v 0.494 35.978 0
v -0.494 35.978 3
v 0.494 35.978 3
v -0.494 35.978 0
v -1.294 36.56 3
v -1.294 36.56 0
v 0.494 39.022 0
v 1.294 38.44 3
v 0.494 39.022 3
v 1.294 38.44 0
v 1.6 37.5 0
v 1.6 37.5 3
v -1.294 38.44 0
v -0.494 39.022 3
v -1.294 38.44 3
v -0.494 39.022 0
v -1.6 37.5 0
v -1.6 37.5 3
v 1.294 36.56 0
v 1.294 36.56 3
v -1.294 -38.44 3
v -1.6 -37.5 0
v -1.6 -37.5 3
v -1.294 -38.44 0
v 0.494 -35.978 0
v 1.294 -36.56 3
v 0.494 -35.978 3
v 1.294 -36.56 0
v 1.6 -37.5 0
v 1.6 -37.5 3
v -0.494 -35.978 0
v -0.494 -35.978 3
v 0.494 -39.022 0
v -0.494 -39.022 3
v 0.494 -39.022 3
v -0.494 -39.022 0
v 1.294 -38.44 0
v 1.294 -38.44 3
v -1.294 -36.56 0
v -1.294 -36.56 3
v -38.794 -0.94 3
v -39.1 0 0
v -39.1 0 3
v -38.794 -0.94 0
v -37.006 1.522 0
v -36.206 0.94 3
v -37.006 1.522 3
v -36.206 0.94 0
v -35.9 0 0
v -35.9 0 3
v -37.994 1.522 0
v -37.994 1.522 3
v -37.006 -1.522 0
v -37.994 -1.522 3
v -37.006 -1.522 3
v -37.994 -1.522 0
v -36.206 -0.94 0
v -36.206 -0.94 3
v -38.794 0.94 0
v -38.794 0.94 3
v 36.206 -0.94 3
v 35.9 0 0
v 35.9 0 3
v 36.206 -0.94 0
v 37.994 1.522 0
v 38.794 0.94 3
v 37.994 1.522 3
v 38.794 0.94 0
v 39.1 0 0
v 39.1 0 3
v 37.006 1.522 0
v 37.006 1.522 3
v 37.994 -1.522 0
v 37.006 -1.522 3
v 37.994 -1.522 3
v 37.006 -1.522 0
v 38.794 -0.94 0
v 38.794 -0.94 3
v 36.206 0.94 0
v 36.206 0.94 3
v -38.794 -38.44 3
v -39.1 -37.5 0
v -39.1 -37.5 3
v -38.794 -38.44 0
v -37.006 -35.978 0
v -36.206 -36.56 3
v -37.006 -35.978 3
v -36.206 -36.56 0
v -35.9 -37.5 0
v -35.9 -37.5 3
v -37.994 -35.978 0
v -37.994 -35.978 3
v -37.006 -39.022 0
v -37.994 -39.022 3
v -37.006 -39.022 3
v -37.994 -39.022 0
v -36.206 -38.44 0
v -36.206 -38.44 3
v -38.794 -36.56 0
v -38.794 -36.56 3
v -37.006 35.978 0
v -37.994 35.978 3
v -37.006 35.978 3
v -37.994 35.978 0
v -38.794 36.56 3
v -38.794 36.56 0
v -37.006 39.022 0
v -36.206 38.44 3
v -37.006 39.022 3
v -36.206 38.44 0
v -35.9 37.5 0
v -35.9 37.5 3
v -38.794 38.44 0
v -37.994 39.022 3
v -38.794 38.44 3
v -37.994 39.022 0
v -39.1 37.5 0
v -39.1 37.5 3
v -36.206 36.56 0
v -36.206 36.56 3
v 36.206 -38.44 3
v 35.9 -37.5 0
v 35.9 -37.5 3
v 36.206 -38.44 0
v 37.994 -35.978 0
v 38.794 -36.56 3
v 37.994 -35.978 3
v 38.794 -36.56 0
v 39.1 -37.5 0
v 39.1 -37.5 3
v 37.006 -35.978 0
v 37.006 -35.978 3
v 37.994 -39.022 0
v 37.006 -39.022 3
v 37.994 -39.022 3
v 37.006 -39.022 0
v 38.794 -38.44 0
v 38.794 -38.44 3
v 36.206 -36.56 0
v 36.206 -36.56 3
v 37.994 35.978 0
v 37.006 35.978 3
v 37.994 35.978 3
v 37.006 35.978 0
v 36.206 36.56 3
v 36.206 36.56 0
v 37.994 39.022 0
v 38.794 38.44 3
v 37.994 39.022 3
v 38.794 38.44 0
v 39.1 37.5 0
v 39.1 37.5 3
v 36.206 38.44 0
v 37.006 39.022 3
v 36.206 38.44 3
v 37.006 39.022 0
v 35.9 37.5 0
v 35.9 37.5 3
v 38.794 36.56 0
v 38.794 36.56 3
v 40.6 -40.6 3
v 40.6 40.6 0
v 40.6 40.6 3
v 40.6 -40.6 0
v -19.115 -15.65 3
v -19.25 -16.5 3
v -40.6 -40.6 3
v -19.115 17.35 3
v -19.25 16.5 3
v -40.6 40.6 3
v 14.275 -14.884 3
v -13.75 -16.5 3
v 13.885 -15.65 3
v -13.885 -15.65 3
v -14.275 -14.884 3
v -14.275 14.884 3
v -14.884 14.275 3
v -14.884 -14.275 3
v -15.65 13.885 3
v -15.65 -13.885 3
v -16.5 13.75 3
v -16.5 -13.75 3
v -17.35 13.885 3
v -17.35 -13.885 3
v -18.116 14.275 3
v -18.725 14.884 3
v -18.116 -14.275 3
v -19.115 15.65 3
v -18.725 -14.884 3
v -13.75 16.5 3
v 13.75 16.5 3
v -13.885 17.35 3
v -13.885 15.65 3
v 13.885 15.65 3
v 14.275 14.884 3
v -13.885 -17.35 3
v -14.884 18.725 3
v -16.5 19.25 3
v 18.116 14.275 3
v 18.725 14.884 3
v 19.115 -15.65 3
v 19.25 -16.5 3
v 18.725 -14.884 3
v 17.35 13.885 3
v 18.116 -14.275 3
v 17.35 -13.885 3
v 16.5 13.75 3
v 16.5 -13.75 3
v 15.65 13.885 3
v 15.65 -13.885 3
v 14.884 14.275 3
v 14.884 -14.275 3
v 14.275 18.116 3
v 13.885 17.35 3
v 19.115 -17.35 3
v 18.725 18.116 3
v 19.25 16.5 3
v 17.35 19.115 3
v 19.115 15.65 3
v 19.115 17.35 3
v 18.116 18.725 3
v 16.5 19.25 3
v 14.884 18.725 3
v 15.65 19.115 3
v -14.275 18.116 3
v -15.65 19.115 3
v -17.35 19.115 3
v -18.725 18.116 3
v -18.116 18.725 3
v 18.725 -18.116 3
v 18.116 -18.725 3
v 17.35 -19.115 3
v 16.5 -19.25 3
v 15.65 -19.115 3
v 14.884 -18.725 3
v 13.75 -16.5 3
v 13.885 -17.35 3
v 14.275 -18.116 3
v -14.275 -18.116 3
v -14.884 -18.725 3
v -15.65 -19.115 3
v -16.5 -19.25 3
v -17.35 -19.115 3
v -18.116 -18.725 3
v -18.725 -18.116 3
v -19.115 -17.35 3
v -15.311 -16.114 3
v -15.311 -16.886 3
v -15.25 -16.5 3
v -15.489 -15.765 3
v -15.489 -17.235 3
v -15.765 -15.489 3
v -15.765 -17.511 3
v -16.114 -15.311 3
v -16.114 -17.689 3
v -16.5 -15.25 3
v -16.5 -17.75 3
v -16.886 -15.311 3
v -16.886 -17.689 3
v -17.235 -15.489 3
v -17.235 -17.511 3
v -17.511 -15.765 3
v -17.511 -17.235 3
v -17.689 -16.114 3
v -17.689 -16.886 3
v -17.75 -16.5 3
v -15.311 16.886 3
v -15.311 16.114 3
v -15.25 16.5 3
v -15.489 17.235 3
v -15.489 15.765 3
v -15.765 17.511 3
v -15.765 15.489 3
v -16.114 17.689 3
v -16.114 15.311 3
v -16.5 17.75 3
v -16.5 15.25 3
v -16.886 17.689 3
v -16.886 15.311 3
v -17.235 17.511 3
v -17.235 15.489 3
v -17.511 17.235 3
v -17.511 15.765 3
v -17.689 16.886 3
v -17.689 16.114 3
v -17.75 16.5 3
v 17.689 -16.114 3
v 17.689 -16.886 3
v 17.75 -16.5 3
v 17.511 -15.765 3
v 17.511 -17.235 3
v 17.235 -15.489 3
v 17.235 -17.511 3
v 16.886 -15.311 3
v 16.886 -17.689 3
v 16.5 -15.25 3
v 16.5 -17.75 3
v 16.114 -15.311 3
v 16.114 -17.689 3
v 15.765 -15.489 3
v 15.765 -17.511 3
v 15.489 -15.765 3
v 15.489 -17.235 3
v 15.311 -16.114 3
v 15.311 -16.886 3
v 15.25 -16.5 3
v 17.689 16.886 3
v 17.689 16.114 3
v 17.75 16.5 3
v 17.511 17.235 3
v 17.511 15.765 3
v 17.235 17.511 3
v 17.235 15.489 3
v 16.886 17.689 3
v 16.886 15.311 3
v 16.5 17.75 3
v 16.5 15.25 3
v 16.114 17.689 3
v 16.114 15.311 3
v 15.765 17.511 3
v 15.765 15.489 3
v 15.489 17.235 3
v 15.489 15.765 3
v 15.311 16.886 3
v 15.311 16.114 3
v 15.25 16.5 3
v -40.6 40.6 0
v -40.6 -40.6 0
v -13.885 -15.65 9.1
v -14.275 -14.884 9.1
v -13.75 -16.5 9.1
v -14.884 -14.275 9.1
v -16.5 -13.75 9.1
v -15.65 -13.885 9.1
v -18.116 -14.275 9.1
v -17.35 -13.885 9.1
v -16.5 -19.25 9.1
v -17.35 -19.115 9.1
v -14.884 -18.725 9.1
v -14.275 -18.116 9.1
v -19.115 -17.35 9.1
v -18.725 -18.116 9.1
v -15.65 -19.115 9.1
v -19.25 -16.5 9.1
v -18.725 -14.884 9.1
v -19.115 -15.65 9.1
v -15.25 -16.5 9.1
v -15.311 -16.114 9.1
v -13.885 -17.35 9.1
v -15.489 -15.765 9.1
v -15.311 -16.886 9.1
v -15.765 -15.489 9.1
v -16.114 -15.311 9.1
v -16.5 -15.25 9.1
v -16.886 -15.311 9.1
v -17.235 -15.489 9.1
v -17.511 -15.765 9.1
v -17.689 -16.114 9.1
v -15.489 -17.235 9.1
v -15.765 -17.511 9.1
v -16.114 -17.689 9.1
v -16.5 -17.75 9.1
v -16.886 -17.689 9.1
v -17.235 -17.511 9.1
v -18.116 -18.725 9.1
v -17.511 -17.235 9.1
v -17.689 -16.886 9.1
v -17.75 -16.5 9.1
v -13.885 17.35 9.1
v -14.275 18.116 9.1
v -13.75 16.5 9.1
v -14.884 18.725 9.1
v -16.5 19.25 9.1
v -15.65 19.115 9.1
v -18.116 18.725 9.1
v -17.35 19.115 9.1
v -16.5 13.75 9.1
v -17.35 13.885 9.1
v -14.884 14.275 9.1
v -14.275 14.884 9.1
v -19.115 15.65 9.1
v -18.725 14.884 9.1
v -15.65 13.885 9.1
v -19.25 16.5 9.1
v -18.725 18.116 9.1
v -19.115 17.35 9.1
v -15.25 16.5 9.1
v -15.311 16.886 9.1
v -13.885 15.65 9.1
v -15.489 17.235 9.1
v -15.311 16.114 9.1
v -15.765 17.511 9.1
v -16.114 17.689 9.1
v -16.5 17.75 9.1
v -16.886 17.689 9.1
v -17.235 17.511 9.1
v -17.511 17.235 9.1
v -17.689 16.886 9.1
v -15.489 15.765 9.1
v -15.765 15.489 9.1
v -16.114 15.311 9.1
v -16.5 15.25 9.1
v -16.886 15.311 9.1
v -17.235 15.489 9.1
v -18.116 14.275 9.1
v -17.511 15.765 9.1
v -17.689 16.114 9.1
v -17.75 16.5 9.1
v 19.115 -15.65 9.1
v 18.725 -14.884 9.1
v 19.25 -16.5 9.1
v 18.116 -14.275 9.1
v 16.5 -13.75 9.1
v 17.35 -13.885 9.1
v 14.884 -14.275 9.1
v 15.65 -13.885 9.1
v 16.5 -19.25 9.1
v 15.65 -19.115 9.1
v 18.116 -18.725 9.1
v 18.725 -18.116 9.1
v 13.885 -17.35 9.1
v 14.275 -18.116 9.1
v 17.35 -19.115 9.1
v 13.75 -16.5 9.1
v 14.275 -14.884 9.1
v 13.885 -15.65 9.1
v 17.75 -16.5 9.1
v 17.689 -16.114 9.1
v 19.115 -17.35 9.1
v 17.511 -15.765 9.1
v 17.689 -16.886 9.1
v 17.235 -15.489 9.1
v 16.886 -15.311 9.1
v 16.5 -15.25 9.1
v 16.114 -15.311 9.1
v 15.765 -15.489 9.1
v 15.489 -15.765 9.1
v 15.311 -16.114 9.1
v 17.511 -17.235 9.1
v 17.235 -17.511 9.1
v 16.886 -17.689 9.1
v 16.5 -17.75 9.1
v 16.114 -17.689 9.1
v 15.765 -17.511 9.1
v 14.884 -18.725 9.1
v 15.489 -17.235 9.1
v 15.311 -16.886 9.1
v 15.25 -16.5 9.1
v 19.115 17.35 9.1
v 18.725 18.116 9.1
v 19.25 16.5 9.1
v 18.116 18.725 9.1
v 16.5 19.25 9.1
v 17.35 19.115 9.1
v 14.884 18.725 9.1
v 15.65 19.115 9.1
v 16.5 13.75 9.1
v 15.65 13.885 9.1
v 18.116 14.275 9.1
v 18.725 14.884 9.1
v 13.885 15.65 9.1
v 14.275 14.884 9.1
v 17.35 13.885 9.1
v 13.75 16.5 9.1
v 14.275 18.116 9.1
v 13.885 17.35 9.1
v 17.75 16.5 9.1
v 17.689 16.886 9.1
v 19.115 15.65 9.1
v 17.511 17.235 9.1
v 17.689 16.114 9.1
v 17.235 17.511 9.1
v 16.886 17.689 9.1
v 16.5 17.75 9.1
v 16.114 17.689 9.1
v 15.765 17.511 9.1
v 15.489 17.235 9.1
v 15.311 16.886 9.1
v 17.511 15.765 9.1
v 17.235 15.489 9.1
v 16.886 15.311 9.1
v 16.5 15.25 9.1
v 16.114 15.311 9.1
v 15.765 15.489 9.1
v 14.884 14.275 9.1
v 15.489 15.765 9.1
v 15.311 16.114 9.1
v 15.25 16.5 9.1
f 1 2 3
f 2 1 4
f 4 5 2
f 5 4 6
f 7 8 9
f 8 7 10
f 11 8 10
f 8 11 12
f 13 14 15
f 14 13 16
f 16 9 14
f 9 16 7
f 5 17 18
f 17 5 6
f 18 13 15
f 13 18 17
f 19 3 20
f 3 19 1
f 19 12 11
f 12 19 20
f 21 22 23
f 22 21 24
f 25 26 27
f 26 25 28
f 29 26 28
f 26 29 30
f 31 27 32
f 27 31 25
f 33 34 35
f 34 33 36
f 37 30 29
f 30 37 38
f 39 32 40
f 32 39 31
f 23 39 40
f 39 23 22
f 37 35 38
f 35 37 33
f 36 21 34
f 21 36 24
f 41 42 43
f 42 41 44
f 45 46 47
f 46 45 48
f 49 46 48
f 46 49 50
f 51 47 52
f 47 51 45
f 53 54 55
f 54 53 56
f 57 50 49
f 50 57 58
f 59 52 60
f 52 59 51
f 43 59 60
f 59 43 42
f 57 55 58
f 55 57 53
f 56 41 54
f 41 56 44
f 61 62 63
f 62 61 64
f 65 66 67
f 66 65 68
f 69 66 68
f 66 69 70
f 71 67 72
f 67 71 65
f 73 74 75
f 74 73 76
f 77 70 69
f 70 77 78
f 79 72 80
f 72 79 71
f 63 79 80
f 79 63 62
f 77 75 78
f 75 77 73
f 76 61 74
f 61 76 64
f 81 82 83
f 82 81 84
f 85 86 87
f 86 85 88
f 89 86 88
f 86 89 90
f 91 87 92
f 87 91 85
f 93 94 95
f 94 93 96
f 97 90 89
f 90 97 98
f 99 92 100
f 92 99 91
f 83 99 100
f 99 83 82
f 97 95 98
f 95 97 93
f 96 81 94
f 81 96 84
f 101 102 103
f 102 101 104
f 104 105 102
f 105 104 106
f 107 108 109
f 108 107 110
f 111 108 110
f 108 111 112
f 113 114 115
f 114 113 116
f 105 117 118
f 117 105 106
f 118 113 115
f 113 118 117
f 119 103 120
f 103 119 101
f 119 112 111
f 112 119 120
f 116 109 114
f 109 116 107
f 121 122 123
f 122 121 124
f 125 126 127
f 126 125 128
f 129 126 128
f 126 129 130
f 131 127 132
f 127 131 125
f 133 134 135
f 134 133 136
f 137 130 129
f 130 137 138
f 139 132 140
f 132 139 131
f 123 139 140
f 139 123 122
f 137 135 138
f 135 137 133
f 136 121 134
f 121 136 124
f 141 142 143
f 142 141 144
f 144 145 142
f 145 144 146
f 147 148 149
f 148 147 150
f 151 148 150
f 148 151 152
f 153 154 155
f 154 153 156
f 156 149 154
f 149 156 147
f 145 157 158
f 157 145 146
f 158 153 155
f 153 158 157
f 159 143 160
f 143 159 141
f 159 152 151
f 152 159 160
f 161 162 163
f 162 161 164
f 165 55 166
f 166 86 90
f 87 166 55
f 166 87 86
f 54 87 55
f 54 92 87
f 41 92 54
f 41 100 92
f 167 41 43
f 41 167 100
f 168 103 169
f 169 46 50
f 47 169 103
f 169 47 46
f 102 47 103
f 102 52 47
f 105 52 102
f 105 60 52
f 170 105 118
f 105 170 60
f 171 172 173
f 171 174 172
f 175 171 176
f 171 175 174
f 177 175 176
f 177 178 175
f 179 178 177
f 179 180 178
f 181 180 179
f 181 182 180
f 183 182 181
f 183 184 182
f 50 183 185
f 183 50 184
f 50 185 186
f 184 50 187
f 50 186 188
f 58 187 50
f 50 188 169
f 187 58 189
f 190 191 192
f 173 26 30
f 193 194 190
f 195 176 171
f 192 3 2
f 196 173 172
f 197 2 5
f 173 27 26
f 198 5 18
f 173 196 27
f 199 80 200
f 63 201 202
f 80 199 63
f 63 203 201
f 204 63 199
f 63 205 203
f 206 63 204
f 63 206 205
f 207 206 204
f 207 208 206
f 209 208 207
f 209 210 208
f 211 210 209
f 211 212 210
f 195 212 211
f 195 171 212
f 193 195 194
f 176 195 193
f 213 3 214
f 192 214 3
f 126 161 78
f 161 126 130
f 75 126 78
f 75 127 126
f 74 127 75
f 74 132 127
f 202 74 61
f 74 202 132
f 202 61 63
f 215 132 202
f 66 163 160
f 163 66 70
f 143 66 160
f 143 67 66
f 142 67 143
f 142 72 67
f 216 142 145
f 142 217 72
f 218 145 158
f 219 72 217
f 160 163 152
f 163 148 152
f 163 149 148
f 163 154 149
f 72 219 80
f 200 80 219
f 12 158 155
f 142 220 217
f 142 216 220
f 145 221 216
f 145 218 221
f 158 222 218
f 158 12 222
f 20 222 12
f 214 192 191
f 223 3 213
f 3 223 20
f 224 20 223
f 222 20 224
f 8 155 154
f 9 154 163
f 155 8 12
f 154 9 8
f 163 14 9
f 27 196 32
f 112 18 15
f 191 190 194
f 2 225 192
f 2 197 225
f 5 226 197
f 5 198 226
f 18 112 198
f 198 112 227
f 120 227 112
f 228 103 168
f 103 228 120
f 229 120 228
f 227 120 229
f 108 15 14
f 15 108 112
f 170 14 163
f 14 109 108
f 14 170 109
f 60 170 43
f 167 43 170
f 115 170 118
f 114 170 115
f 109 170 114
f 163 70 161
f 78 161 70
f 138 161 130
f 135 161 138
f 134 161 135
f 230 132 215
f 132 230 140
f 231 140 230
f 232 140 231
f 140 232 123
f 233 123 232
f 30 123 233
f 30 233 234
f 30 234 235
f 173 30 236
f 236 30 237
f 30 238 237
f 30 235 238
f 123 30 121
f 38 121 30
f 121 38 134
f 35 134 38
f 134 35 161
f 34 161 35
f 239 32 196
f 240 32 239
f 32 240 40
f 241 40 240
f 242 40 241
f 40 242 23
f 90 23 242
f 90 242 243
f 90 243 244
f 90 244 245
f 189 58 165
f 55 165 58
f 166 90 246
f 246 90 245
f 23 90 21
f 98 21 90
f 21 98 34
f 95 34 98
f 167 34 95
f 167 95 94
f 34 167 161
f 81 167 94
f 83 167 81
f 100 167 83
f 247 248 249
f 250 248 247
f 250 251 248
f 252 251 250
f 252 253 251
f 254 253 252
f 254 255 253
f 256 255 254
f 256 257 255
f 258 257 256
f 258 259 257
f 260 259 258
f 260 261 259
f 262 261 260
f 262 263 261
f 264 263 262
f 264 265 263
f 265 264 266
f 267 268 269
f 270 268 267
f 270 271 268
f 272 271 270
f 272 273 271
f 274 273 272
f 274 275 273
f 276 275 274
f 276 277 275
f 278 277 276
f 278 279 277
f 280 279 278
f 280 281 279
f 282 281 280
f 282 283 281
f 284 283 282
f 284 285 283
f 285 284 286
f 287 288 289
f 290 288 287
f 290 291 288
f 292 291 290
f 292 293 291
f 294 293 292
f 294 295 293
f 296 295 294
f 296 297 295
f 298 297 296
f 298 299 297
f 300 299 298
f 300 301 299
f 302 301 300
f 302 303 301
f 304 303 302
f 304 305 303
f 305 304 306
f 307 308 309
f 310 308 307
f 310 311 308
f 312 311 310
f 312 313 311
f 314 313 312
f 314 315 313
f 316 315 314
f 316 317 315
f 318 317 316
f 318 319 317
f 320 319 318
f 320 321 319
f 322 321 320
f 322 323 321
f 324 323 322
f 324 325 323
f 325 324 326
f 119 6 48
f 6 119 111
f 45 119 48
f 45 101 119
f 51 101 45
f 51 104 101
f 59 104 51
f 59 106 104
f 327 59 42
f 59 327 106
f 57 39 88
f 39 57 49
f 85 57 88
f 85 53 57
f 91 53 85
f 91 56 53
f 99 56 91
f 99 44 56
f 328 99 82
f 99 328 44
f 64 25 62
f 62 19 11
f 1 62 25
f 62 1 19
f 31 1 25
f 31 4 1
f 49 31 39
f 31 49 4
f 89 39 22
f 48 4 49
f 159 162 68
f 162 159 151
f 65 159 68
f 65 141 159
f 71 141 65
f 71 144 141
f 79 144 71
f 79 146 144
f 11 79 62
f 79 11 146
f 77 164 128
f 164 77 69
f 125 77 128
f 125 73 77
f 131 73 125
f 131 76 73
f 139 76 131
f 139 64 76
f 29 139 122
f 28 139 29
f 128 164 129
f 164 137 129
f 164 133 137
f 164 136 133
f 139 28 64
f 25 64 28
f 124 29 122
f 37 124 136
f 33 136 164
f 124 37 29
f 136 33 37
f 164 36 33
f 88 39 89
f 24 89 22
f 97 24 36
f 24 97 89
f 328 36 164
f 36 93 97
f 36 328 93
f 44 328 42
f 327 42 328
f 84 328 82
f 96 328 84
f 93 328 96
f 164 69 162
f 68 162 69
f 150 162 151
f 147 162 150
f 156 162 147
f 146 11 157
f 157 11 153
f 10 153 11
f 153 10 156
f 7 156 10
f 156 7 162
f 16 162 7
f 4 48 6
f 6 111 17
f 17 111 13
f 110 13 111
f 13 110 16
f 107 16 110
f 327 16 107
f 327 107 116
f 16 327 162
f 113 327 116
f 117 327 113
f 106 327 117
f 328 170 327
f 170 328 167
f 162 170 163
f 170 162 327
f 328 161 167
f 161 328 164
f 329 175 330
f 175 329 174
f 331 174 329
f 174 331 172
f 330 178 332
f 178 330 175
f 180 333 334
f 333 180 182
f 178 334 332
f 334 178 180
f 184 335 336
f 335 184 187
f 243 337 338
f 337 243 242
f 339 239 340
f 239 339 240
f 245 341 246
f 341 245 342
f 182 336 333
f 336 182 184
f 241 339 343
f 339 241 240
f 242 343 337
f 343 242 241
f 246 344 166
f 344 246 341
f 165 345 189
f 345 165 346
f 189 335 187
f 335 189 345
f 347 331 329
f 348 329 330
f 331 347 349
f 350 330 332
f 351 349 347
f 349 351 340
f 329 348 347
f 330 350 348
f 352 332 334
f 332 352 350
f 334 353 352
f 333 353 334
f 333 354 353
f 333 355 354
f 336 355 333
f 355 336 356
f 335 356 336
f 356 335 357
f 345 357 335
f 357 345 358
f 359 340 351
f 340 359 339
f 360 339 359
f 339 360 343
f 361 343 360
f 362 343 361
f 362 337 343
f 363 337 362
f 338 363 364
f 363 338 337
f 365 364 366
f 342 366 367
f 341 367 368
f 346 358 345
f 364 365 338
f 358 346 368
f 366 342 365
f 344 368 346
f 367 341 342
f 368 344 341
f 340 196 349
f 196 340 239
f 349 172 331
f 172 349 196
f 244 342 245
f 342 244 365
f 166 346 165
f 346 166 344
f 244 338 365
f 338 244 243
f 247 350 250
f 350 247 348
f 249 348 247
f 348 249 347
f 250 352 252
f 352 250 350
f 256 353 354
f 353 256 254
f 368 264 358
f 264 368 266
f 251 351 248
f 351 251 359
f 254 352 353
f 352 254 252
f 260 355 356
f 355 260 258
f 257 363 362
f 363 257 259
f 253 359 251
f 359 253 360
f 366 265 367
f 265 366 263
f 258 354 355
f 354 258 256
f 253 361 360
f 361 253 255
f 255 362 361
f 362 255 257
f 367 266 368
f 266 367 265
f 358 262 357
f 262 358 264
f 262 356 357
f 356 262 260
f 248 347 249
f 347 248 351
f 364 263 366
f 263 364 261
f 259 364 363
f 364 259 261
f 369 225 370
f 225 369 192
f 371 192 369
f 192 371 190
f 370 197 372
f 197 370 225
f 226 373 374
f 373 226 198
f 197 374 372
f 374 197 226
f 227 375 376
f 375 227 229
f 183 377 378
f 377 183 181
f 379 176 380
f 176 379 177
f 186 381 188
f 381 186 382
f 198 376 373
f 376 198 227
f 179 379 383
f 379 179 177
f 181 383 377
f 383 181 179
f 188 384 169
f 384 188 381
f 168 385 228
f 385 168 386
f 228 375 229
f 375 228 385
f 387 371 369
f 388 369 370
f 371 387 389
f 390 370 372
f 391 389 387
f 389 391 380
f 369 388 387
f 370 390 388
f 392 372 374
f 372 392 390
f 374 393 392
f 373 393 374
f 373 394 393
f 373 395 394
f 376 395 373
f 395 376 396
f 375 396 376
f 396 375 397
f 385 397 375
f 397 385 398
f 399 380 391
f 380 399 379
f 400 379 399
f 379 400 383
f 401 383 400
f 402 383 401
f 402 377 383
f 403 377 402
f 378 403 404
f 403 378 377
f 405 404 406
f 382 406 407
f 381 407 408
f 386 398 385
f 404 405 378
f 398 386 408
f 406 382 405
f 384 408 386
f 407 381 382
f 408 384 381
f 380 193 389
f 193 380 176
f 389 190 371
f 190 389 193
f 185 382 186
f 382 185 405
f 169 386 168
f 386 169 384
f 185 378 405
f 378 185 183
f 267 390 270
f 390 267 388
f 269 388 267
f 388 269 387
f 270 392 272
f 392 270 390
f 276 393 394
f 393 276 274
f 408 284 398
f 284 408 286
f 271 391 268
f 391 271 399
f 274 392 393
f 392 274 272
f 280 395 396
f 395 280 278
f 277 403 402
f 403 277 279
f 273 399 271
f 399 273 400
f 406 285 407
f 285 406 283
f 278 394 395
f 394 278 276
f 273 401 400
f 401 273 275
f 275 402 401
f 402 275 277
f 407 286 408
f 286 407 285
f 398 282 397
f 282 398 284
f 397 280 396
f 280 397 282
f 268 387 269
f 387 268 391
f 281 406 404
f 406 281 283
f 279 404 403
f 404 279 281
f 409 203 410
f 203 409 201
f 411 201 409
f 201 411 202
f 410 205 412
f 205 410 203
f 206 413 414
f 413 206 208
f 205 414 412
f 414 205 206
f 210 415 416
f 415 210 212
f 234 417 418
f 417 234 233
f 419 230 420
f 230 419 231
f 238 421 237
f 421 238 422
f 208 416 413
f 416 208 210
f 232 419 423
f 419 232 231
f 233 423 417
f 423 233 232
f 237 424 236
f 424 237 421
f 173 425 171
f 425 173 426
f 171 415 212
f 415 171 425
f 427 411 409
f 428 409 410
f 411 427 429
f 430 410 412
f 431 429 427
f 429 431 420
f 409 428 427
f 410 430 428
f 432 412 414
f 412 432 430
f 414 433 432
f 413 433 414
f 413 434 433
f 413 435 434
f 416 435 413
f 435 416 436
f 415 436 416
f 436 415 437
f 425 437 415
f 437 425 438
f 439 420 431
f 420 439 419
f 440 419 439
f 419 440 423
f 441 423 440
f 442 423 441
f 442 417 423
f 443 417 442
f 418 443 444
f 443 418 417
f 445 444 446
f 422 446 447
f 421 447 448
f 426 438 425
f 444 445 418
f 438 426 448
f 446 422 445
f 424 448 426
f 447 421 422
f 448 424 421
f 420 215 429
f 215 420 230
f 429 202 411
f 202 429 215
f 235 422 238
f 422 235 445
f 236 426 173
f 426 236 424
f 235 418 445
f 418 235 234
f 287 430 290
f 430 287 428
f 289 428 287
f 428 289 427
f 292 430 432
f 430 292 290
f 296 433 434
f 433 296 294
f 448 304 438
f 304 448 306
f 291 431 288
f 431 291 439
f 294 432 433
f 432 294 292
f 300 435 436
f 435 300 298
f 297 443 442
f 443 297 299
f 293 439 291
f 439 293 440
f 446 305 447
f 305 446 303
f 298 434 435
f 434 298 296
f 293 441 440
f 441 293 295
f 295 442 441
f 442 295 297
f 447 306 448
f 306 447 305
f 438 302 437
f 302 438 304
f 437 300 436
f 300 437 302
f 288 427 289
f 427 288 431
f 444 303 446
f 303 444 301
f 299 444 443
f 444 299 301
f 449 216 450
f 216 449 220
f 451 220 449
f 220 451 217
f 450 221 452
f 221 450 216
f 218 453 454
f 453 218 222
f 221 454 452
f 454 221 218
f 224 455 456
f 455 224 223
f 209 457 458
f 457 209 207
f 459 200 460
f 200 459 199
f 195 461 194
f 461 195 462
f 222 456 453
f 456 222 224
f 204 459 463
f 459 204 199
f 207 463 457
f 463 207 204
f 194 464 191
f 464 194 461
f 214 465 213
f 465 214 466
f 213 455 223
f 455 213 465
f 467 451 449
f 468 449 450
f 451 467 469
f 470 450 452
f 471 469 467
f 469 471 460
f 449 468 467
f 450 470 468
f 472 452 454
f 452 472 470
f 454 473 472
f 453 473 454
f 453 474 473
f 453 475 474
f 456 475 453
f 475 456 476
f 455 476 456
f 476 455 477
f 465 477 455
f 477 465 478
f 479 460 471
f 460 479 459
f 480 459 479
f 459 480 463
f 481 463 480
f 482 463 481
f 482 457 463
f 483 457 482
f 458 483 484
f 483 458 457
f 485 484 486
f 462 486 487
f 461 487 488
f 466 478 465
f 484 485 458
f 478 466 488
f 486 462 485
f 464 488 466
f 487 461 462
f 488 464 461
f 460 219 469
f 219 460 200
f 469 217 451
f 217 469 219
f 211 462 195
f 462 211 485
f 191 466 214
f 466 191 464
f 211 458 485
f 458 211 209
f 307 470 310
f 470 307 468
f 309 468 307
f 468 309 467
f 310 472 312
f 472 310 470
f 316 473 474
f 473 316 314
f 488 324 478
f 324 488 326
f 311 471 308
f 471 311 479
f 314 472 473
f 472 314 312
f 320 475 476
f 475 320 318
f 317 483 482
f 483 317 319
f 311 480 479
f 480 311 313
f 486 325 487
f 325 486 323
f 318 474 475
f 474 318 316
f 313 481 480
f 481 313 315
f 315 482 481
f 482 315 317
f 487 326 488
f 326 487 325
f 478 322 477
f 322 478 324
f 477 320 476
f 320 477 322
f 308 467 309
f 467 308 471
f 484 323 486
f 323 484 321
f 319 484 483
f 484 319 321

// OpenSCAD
//Multirotor plate customizer V0.1.3 by eriqjo
//
//v0.2.1 6/4/2014	Major bug fix for standoffs and holes not rendering correctly
//v0.2.0 5/26/2014	Added more clearance between slots and mounting holes
//					Added KK2 Mounting feature
//					Shortened radio supports to minimize plug interference
//					Added custom plate features
//v0.1.2 5/25/2014	Improved resolution for holes
//					Added option for control board mount
//v0.1.1 5/24/2014	Initial release of project
//

//CUSTOMIZER VARIABLES

/* [Plate Dimensions] */

//Choose predefined platform, or custom
Multirotor_Platform = 3; // [1:Arducopter, 3:Custom]

//Choose type of plate to create
Plate_Type = 2; // [1:Radio,2:Control Board,3:Slotted,4:Custom Plate]

//Choose how thick to make the plate, mm
Plate_Thickness = 3; // [1:6]

Mounting_Bolt_Size = 3.2; // [2.2:M2,3.2:M3,4.2:M4,5.2:M5,6.2:M6]

//Center-to-center distance of adjacent mounting holes (custom only), mm
X_and_Y_Distance = 75; //

//Add a hole in the middle?
Additional_Hole = "Yes"; // [Yes,No] 

/* [Radio Plate] */

//How wide (y) is your radio RX, mm?
Radio_Width = 34.5;

//How long (x) is your radio RX, mm?
Radio_Length = 52;

//How many cable-ties to hold the radio down?
Cable_Tie_Ct = 2; // [0:3]

//How wide are your cable-ties, mm?
Cable_Tie_Width = 4;

//How tall do you want the supports, mm?
Support_Height = 5;

/* [Control plate] */

Control_Board = 2; // [1:KK2,2:Custom]

//Center-to-center distance in X-direction (custom only), mm
Control_Board_X = 33;

//Center-to-center distance in Y-direction (custom only), mm
Control_Board_Y = 33;

//How tall to make standoffs
Standoff_Height = 6;

//What size bolt to attach board (custom only)
Control_Board_Bolt = 2.5; // [1.6:M2,2.05:M2.5,2.5:M3,3.5:M4,4.5:M5]

/* [Slotted Plate] */

//How wide do you want the slots, mm?
Slot_Width = 3; // [1:5]

//Note: Too many wide slots will intersect.
Number_of_Slots = 11;

Profile = 1; // [1:Rounded,2:Square]

/* [Custom Plate] */

//Size of holes, mm 
Hole_Diameter = 3;

//Matrix of hole coordinates, ex: [[1,2], [2,3]]
Hole_Matrix = [[-22, -22], [-22, 22], [22, -22], [22, 22]];

//Hole diameter inside standoffs, mm
Standoff_Hole_D = 2.5;

//How tall to make the standoffs, mm
Custom_Standoff_Height = 6;

//Matrix of standoff coordinates, ex: [[1,2], [2,3]]
Standoff_Matrix = [[-15, -15], [-15, 15], [15, -15], [15, 15]];

//CUSTOMIZER VARIABLES END

/* [Hidden] */

Support_Width = 4; // How wide the radio structure will be

Support_Length = 4; // How long the corners are

Radio_Dim_Margin = 0.3; // Makes the holder a little bit bigger than measured so there is no interference

AntiCoPlanar = 0.2; // Make things bigger by this much so there are not ambiguous faces

Safety_Perimeter = 3; // Distance between the bolt hole and the edge of the plate

//***************************************************

module makeBase(){

	q = X_and_Y_Distance;

	if (Multirotor_Platform == 1){
		difference(){
			baseExtrude(68.25);
			baseHoles(68.25);
		}
	}

	if (Multirotor_Platform == 2){
		difference(){
			baseExtrude(q);
			baseHoles(q);
		}
	}

	if (Multirotor_Platform == 3){
		difference(){
			baseExtrude(q);
			baseHoles(q);
		}
	}

}

//***************************************************

module makeCustomPlate(){

	difference(){
		union(){
			addStandOffs(Standoff_Matrix, Standoff_Hole_D, Custom_Standoff_Height);
			makeBase();
		}	
		addHoles(Hole_Matrix, Hole_Diameter);
	}
}

//***************************************************

module makeSlots(dist){

	availableXY = dist - 2*Safety_Perimeter - Mounting_Bolt_Size;
	supportX = (availableXY - (Number_of_Slots * Slot_Width))/(Number_of_Slots - 1);
	echo(supportX);
	offset = supportX + Slot_Width;

	translate([-availableXY/2 + Slot_Width/2, 0, 0])
	for (i = [0:Number_of_Slots-1]){
		if (Profile == 1){
			translate([i * offset, 0, 0]){
				union(){
					cube([Slot_Width, availableXY - Slot_Width, 2*Plate_Thickness], center = true);
					translate([0, (availableXY - Slot_Width)/2, 0])	{
						cylinder(h = 2*Plate_Thickness, r = Slot_Width/2, center = true);
					}
					translate([0, -(availableXY - Slot_Width)/2, 0]){
						cylinder(h = 2*Plate_Thickness, r = Slot_Width/2, center = true);
					}
				}
			}
		}
		if (Profile == 2){
			translate([i * offset, 0, 0]){
				cube([Slot_Width, availableXY, 2*Plate_Thickness], center = true);
			}
		}
	}

}

//***************************************************

module radioSupport(){

	translate([0, 0, Support_Height/2 + Plate_Thickness/2]){
		difference(){
			cube([Radio_Length + Support_Width, Radio_Width + Support_Width, Support_Height + AntiCoPlanar], center = true);
			cube([Radio_Length + Radio_Dim_Margin, Radio_Width + Radio_Dim_Margin, Support_Height + 2*AntiCoPlanar], center = true);
			cube([Radio_Length + 2*Support_Width + AntiCoPlanar, Radio_Width - 2*Support_Length, Support_Height + 2*AntiCoPlanar], center = true);
			cube([Radio_Length - 2*Support_Length, Radio_Width + 2*Support_Width + AntiCoPlanar, Support_Height + 2*AntiCoPlanar], center = true);
		}		
	}
}

//***************************************************

module makeControlBoardPlate(){

	customX = Control_Board_X/2;
	customY = Control_Board_Y/2;

	if (Control_Board == 1){
		union(){
			makeBase();
			addStandOffs([[-22,-22],[-22,22],[22,-22],[22,22]], 2.5, Standoff_Height);			
		}
	}

	if (Control_Board == 2){
		union(){
			makeBase();
			addStandOffs([[-customX,-customY],[-customX,customY],[customX,-customY],[customX,customY]], Control_Board_Bolt, Standoff_Height);
		}
	}

}

//***************************************************

module makeRadioPlate(){

	union(){
		difference(){
			makeBase();
			cableTieHoles();
		}
		radioSupport();
	}

}

//***************************************************

module makeSlotPlate(s){

	difference(){
		makeBase();
		makeSlots(s);
	}

}

//***************************************************

module baseExtrude(Hole_Spacing){

	Square_Dims = Hole_Spacing + Mounting_Bolt_Size + Safety_Perimeter;
	cube([Square_Dims, Square_Dims, Plate_Thickness], center = true);
	
}

//****************************************************

module addStandOffs(location, diameter, height){

	for (i = location){
		translate([i[0], i[1], Plate_Thickness/2 + height/2])
		difference(){
			cylinder(h = height + AntiCoPlanar, r = (diameter + 3)/2, center = true, $fn = 20);
			cylinder(h = height + 2*AntiCoPlanar, r = diameter/2, center = true, $fn = 20);
		}
	}

}

//****************************************************

module cableTieHoles(){

	Hole_Y_Top = Radio_Width/2 + Support_Width + Cable_Tie_Width/2;
	Hole_Y_Bottom = -Hole_Y_Top; 

	if (Cable_Tie_Ct == 0) {  }  //Do nothing

	if (Cable_Tie_Ct == 1) {
		addHoles([[0,Hole_Y_Top],[0, Hole_Y_Bottom]], Cable_Tie_Width);
	}

	if (Cable_Tie_Ct == 2) {
		addHoles([[-0.25*Radio_Length, Hole_Y_Top], [0.25*Radio_Length, Hole_Y_Top],
			[-0.25*Radio_Length, Hole_Y_Bottom], [0.25*Radio_Length, Hole_Y_Bottom]], Cable_Tie_Width);
	}

	if (Cable_Tie_Ct == 3) {
		addHoles([[-0.4*Radio_Length, Hole_Y_Top], [0.4*Radio_Length, Hole_Y_Top],
			[0, Hole_Y_Top], [0, Hole_Y_Bottom],
			[-0.4*Radio_Length, Hole_Y_Bottom], [0.4*Radio_Length, Hole_Y_Bottom]], Cable_Tie_Width);
	}

}

//****************************************************

module baseHoles(xyDim){

	if (Additional_Hole == "Yes"){
		addHoles([[0, xyDim/2], [0, -xyDim/2],
			[-xyDim/2, 0], [xyDim/2, 0]], Mounting_Bolt_Size);
	}

	addHoles([[-xyDim/2, -xyDim/2], [-xyDim/2, xyDim/2],
		[xyDim/2, -xyDim/2], [xyDim/2, xyDim/2]], Mounting_Bolt_Size);

}

//****************************************************

module addHoles(pos, dia){		//Add hole at [x, y, d]

	for (i = pos){
		translate([i[0], i[1], 0]) cylinder(h = 2*(Plate_Thickness + Support_Height), r = dia/2, center = true, $fn = 10);
	}

}

//*****************************************************

//Here is the runtime stuff

if (Plate_Type == 1) {
	translate([0, 0, Plate_Thickness/2]) makeRadioPlate();
}

if (Plate_Type == 2) {
	translate([0, 0, Plate_Thickness/2]) makeControlBoardPlate();
}

if (Plate_Type == 3) {
	translate([0, 0, Plate_Thickness/2])
	if (Multirotor_Platform == 1){
		makeSlotPlate(68.25);
	}

	translate([0, 0, Plate_Thickness/2])
	if (Multirotor_Platform == 3){
		makeSlotPlate(X_and_Y_Distance);
	}

}

if (Plate_Type == 4){
	translate([0, 0, Plate_Thickness/2]){
		makeCustomPlate();
	}
}





